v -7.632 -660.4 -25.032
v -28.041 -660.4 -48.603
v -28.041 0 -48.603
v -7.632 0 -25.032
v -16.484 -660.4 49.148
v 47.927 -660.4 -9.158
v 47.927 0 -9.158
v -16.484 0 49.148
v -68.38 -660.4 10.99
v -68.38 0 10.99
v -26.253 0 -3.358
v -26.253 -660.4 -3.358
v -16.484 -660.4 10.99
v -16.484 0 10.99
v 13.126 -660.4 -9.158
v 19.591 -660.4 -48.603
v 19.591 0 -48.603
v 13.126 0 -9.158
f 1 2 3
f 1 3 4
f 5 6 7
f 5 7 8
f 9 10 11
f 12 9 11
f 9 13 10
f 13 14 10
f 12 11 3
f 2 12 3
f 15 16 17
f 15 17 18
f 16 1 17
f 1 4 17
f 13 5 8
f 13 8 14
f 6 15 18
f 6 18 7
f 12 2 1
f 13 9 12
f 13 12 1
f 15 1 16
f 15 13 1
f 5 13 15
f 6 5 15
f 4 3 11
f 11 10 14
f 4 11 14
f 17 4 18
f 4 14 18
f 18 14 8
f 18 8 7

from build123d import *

# Parameters (mm, degrees)
F1_DEPTH = 25.4
F2_DEPTH = 609.6
F3_DEPTH = 25.4


with BuildPart() as f1:
    # F0 (on Front) → F1 (new body)
    with BuildSketch(Plane.XZ):
        Polygon((-28.0406700106, -48.6028654858), (-7.6316785999, -25.0319186598), (19.5911039028, -48.6028654858), (13.1264980882, -9.1580180451), (47.9269810021, -9.1580180451), (-16.4844300598, 49.1480454803), (-16.4844300598, 10.9896259382), (-68.3798789978, 10.9896259382), (-26.2529868633, -3.3579384908), align=None)
    extrude(amount=F1_DEPTH)

    # F2 (add): a face of the model
    f2_faces = [f1.faces().sort_by_distance(p)[0] for p in [
        (-3.7729101516, -25.4, -1.8402904119),
    ]]
    extrude(f2_faces, amount=F2_DEPTH)

    # F3 (add): a face of the model
    f3_faces = [f1.faces().sort_by_distance(p)[0] for p in [
        (-3.7729101516, -635, -1.8402904119),
    ]]
    extrude(f3_faces, amount=F3_DEPTH)


solid = f1.part
